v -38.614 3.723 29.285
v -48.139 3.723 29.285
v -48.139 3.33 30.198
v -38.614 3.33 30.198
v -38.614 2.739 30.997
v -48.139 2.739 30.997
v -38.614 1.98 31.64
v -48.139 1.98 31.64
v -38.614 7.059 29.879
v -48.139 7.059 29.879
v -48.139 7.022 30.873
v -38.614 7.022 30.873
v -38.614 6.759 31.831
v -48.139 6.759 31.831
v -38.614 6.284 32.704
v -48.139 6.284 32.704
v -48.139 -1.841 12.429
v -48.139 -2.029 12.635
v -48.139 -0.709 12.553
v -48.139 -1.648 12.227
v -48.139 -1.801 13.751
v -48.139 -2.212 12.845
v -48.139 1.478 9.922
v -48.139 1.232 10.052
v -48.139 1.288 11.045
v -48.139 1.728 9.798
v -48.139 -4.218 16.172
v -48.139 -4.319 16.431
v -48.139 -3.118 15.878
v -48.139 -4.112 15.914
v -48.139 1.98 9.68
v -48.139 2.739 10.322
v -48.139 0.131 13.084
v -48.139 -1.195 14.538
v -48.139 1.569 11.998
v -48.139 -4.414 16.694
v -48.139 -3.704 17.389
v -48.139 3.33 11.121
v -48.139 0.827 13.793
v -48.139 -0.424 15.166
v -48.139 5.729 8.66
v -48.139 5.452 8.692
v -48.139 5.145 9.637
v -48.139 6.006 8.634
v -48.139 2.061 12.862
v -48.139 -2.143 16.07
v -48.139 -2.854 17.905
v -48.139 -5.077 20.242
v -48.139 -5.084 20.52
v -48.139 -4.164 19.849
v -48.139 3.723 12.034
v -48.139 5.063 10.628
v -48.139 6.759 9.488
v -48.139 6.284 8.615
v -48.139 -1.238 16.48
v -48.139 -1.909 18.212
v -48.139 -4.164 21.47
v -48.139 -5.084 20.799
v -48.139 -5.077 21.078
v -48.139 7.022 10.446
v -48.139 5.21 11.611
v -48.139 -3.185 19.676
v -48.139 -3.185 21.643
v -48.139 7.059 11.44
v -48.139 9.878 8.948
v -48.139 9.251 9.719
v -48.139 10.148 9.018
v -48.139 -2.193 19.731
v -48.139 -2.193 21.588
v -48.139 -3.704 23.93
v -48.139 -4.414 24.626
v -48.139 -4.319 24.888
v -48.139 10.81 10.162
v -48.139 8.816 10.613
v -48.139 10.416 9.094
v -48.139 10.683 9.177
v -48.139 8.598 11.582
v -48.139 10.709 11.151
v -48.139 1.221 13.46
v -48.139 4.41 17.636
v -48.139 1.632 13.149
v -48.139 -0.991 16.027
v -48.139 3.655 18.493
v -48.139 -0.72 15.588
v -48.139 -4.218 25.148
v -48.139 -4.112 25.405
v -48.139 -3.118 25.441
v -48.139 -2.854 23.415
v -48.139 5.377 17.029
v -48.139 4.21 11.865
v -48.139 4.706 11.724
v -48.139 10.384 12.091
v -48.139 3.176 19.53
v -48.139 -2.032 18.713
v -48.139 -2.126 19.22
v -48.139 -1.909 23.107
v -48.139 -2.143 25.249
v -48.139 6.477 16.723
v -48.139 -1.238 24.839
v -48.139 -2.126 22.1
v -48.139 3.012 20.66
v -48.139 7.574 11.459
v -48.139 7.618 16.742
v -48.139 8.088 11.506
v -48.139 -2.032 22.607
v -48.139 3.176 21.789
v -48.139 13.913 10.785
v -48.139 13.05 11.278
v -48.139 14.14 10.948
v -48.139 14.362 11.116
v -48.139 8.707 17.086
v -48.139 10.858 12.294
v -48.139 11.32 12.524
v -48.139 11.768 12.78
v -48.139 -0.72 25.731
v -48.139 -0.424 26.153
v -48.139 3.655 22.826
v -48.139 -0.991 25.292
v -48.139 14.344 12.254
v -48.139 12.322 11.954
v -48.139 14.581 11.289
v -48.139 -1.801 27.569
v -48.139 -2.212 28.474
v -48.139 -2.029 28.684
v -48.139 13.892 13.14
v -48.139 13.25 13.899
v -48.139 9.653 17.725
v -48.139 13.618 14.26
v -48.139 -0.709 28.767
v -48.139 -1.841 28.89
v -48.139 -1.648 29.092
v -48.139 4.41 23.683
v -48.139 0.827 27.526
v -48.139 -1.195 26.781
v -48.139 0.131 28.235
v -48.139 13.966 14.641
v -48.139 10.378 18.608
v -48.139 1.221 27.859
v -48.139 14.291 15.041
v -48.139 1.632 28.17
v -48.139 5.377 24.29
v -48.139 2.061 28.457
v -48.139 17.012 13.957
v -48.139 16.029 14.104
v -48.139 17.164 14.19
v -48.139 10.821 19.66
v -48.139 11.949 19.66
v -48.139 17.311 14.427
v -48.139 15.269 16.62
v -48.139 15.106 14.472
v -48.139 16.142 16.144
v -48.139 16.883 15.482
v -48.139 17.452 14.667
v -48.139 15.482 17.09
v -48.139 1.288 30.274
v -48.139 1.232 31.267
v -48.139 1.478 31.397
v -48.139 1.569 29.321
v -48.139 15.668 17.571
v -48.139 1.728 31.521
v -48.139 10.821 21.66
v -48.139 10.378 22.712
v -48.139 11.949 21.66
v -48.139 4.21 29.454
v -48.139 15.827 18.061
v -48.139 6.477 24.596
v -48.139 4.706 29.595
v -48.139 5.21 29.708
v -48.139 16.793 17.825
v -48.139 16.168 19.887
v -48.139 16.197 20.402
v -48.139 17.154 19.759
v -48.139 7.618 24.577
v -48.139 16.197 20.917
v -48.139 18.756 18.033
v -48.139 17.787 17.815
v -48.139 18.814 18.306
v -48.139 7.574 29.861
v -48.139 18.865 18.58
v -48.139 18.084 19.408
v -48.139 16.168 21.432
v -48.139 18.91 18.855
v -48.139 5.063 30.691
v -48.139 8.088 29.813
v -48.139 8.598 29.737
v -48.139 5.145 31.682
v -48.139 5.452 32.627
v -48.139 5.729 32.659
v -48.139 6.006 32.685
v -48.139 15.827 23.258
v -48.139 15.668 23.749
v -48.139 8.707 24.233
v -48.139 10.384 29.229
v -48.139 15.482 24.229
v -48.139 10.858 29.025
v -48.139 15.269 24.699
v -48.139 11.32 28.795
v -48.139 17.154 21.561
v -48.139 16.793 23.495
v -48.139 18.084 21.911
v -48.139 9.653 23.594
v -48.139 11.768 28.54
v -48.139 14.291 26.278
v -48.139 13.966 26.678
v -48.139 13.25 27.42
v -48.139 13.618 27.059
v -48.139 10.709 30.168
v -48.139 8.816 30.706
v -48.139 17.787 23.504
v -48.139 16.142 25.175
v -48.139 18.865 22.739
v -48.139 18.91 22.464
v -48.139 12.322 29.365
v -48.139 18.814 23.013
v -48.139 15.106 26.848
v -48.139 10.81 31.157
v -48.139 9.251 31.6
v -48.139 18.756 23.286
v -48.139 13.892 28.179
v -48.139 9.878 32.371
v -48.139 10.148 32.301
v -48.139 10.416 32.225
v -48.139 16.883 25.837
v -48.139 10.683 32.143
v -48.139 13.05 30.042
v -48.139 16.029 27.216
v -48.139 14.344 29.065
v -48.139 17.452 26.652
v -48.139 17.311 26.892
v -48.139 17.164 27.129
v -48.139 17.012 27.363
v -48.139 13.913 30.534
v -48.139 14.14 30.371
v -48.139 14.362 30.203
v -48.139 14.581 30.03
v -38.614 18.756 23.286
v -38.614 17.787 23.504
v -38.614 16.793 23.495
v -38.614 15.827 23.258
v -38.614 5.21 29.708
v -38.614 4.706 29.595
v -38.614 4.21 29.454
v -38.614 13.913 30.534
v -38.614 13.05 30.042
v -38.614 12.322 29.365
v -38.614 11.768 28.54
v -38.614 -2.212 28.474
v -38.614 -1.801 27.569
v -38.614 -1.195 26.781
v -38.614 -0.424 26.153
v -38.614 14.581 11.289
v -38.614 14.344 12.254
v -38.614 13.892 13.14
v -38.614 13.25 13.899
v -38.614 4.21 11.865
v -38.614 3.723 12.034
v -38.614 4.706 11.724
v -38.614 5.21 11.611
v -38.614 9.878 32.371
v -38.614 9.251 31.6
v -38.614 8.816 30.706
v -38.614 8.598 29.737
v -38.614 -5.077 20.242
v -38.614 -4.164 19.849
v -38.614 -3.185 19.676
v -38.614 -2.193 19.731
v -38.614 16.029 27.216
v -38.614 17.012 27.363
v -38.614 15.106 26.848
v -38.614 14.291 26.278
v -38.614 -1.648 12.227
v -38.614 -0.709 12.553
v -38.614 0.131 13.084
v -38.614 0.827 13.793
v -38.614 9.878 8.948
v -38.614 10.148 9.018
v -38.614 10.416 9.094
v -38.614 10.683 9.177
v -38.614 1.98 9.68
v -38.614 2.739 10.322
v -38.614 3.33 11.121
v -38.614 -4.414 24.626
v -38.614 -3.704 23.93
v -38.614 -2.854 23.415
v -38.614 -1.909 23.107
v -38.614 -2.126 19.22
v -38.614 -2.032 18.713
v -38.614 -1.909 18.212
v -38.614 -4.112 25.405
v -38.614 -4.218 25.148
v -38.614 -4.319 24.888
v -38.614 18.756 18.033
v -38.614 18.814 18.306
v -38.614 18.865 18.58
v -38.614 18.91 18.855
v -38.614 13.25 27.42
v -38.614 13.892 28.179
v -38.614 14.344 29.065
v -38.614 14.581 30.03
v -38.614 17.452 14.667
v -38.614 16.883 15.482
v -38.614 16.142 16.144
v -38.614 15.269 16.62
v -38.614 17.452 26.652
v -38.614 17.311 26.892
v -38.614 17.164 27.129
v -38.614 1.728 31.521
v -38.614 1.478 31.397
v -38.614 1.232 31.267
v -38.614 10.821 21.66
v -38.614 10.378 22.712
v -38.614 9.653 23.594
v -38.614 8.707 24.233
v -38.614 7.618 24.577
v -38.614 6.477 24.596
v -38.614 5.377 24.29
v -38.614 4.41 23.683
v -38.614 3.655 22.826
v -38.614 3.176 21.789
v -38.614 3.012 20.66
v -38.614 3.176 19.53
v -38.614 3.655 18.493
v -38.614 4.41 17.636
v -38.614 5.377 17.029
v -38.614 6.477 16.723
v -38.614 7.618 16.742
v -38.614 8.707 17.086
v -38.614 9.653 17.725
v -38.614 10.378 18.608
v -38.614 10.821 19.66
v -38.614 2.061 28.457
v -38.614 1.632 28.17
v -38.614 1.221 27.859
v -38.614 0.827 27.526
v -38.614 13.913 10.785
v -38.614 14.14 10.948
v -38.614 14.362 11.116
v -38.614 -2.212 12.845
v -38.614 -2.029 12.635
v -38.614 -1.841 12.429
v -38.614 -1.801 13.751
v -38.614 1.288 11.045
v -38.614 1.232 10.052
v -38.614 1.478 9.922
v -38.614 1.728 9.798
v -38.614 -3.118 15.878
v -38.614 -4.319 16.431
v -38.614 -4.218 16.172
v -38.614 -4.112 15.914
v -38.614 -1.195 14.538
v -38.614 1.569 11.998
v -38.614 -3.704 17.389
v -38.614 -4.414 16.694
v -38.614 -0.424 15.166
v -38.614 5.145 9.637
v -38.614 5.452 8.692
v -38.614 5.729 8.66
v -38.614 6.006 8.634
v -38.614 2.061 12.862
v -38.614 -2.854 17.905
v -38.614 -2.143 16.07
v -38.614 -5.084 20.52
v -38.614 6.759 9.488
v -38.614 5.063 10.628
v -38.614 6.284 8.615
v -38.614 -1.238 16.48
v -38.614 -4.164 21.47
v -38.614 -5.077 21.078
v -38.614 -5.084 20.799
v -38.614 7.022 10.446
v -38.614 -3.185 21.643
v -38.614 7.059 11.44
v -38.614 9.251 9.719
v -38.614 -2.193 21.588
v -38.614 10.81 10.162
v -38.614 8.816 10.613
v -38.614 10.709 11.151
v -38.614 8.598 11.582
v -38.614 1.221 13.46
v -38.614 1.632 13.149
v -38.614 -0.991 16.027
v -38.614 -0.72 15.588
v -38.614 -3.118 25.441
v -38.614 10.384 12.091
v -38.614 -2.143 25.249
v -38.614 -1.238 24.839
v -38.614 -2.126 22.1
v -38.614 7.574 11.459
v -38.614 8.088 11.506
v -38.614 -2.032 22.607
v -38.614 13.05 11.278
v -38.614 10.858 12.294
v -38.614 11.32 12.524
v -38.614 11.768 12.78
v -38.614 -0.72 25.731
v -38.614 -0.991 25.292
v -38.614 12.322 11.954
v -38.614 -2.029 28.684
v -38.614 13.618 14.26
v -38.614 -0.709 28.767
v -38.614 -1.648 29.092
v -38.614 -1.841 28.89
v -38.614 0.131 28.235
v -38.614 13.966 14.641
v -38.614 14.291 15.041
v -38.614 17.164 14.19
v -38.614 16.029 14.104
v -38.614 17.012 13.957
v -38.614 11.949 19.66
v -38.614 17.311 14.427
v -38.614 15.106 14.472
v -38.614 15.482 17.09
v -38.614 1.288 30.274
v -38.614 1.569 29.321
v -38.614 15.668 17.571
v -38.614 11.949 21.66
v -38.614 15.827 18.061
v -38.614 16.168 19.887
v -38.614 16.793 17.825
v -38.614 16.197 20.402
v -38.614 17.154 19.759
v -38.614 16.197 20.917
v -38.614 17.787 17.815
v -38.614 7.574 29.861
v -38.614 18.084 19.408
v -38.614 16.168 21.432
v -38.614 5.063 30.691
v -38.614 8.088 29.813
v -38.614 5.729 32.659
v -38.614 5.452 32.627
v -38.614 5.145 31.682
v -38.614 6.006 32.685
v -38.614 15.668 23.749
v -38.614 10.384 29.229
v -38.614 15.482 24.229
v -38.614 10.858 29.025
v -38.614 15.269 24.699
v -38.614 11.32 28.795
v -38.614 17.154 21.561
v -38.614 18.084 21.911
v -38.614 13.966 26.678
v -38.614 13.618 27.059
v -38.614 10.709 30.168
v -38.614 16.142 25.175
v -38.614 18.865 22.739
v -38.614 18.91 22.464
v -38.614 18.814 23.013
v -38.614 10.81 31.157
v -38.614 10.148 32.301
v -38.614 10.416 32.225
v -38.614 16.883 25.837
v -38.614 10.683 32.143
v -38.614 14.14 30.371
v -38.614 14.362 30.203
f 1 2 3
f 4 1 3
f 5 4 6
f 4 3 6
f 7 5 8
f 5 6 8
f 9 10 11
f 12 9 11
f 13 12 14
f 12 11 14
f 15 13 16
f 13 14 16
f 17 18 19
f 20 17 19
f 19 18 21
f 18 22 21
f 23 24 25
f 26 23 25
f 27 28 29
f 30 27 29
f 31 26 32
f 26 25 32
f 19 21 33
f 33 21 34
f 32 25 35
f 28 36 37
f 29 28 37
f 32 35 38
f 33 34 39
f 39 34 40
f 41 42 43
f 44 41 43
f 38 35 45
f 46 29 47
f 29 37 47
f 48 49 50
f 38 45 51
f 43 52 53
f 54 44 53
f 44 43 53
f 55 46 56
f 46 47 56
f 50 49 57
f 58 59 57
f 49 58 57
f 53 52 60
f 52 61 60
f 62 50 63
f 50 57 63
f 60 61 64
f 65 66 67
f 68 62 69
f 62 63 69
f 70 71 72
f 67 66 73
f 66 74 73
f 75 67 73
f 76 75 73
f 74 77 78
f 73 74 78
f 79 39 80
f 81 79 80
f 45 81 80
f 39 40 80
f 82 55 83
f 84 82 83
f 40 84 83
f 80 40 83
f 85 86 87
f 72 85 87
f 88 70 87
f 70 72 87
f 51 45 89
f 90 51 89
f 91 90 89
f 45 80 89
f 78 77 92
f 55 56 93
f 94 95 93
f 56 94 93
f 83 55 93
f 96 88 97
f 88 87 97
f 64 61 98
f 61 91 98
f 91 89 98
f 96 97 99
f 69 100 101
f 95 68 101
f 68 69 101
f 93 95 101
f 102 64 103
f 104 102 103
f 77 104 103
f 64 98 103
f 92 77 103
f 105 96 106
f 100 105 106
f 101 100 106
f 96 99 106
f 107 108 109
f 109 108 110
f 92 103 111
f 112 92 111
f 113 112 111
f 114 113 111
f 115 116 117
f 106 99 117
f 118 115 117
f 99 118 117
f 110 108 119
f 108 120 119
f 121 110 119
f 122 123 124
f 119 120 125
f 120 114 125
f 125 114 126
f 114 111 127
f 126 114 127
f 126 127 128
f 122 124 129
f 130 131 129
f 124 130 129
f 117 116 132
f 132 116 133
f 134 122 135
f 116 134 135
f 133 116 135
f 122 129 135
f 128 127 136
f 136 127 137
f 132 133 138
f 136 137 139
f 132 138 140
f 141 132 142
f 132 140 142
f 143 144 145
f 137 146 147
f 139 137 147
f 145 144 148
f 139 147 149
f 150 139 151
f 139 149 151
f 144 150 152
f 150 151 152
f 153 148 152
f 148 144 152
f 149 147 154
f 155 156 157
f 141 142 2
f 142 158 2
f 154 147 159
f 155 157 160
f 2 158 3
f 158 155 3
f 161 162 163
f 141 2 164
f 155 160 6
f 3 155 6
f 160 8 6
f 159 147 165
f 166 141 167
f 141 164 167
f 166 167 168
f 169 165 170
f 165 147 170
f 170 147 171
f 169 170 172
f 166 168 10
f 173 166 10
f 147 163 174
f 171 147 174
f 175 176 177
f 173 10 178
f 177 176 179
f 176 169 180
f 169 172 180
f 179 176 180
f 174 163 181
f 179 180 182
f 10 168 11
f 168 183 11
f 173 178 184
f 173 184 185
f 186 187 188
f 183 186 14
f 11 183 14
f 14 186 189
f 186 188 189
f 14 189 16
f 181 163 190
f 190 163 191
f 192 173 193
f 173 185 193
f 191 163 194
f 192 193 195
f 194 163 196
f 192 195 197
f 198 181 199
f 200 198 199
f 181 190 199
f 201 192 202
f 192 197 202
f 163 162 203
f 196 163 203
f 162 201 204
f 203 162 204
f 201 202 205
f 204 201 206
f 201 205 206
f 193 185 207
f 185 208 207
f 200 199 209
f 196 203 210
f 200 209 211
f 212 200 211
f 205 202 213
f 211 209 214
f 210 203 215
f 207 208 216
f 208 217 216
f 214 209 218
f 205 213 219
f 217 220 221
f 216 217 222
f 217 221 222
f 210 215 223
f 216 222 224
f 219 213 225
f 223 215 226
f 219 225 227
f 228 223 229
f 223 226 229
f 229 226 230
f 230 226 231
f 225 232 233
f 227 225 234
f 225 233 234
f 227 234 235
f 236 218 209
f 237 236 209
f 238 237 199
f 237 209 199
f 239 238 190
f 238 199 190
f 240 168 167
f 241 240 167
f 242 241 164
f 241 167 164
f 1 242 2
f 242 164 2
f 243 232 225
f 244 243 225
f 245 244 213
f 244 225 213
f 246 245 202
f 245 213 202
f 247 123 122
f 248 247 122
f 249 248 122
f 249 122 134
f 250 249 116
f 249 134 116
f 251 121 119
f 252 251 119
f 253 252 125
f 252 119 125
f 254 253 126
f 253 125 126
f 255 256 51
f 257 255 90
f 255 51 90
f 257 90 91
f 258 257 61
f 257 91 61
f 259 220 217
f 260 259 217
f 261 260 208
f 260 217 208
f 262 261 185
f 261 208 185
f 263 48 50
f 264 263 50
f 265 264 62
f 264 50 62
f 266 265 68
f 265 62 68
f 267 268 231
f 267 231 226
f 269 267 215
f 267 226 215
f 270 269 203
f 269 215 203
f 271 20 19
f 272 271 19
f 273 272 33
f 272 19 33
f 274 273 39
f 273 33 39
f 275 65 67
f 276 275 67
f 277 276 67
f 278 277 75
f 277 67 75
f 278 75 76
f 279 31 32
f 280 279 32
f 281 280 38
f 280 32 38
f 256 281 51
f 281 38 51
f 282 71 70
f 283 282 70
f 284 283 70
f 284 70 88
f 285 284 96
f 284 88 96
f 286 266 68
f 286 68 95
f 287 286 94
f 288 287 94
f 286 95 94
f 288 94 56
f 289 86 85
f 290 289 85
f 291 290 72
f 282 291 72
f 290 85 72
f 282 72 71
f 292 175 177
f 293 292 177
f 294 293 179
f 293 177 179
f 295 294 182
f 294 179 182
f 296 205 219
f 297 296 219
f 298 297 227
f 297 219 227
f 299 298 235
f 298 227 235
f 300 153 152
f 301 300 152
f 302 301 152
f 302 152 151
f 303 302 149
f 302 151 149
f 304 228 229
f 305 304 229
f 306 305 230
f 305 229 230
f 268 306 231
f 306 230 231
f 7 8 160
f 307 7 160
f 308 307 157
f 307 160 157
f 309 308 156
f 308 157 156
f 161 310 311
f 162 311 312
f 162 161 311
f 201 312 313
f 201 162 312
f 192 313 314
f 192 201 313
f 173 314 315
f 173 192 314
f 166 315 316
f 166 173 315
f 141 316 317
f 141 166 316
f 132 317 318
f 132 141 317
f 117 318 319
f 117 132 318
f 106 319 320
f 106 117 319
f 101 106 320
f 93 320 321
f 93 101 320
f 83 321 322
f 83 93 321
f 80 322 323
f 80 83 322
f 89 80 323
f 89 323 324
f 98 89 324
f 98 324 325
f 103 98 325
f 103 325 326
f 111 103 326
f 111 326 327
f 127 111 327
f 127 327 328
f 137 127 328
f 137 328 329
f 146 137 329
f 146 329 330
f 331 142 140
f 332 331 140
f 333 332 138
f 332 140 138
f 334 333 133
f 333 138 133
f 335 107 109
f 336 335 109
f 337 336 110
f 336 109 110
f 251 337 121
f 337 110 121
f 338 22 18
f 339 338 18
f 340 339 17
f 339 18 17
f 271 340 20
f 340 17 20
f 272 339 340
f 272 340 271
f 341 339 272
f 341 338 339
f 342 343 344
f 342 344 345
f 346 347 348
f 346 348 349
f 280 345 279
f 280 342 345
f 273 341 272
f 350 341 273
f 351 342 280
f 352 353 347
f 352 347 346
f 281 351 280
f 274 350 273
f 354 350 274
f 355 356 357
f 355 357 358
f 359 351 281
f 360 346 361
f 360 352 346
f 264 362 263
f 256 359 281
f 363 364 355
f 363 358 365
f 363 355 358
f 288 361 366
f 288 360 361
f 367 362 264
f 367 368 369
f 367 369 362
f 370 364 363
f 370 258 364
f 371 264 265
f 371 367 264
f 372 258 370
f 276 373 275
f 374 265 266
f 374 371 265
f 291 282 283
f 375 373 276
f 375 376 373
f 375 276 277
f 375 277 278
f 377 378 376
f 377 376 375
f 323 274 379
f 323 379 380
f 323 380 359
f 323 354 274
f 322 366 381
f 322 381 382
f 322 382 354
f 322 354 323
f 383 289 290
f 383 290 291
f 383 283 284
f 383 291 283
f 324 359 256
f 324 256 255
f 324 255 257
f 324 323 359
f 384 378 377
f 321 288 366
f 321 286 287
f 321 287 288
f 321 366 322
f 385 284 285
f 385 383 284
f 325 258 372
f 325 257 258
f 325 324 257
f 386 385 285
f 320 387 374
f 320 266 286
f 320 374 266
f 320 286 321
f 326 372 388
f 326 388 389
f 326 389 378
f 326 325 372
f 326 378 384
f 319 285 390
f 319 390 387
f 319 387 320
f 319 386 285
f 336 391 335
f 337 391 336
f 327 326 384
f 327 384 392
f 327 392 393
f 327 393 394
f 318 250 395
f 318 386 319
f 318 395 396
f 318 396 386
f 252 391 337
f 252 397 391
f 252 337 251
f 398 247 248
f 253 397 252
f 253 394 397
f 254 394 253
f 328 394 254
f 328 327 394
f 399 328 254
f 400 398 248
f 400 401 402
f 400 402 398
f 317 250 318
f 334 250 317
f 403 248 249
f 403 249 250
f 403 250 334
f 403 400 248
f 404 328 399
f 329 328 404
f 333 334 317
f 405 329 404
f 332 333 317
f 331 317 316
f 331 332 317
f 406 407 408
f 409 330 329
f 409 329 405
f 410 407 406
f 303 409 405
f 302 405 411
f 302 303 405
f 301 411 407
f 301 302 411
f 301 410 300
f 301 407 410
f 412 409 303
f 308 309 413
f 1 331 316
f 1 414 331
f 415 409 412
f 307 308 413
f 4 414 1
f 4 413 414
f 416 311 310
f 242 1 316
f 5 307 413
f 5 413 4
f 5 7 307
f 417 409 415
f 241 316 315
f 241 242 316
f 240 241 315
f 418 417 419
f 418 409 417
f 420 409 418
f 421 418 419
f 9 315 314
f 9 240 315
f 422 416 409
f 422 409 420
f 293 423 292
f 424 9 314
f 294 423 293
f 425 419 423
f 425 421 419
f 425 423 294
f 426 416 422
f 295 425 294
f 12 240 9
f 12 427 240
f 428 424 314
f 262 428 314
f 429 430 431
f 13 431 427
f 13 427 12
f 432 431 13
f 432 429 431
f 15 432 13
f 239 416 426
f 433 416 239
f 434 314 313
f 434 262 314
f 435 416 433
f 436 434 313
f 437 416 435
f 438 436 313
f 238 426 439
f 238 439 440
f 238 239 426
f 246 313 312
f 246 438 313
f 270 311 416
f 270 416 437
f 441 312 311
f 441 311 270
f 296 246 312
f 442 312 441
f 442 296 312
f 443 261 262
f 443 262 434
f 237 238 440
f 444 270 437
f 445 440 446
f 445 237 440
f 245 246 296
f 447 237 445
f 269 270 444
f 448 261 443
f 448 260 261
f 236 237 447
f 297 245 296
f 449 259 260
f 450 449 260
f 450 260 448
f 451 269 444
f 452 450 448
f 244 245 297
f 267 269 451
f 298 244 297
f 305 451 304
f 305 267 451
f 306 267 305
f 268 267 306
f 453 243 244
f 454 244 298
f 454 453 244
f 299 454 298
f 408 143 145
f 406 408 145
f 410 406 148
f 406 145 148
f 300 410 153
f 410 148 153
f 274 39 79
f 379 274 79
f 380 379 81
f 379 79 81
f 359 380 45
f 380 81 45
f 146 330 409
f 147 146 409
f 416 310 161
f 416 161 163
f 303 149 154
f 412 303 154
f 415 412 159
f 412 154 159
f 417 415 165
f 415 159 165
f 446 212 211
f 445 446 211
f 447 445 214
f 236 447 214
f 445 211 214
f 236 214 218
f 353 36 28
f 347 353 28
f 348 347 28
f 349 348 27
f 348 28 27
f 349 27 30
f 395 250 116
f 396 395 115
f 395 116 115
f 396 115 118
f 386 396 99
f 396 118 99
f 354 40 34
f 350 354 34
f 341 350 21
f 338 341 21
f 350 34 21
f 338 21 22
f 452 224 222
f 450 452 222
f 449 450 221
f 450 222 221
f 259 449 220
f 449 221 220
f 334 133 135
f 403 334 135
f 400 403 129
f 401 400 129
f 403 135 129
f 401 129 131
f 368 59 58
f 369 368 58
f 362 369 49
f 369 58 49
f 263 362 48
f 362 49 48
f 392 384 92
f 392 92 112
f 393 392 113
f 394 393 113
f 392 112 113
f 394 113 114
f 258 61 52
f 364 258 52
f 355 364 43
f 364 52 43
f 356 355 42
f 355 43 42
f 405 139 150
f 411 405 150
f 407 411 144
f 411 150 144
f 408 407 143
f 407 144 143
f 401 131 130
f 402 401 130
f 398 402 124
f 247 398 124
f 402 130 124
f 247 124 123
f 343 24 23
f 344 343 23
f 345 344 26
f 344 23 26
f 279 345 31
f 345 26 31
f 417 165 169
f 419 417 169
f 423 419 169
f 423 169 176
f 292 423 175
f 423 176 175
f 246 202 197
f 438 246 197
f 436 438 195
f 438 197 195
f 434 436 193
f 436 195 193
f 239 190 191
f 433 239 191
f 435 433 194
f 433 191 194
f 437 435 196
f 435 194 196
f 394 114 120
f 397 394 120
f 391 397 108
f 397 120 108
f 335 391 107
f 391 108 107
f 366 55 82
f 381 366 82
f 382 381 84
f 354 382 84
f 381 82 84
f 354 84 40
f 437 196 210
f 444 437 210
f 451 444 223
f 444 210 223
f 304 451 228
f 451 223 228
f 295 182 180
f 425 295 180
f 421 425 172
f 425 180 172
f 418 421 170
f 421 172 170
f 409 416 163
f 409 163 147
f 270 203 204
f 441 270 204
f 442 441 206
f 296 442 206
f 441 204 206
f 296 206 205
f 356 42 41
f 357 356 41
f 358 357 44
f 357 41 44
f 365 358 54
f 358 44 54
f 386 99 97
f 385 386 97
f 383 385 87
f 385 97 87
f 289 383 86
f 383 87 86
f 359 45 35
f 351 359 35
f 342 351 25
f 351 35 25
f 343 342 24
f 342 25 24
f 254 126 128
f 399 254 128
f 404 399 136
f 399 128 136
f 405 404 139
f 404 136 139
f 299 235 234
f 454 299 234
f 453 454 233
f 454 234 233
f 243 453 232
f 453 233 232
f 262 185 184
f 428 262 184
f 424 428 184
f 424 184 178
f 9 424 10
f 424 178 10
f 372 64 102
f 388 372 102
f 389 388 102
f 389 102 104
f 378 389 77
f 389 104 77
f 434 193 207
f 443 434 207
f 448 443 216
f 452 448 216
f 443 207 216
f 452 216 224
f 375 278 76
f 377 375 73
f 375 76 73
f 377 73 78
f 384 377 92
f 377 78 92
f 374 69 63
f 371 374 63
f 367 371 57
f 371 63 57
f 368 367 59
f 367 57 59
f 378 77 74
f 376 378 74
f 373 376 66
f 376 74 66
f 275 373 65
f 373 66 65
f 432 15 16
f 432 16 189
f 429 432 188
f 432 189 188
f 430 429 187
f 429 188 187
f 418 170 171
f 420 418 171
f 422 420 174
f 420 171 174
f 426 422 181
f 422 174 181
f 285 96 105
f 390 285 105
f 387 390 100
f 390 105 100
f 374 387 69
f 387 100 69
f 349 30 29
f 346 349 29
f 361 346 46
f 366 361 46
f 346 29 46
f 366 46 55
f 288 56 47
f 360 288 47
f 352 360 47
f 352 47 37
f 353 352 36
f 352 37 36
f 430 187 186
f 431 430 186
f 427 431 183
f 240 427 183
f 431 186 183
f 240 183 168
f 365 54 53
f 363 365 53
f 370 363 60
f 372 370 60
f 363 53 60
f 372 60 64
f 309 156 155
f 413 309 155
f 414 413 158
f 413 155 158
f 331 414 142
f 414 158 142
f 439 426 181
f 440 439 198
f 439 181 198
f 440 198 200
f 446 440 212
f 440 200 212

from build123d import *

# Parameters (mm, degrees)
SPUR_START             = -48.138720077
SPUR_GEAR_AI_OUTLINE_R = 3.96875
SPUR_GEAR_AI_DEPTH     = 9.525
SKETCH1_W              = 2
SKETCH1_H              = 2
CUT_EXTRUDE1_DEPTH     = 39.960158194


# Read off the part's stored shape, not the designer's step: spur gear_ai
with BuildPart() as part:
    # spur gear_ai outline → spur gear_ai (new body)
    with BuildSketch(Plane.YZ.offset(SPUR_START)):
        with BuildLine():
            ThreePointArc((17.012312953, 13.95653765), (17.238554936, 14.308167954), (17.452476746, 14.667426586))
            ThreePointArc((17.452476746, 14.667426586), (16.531280061, 15.83450279), (15.268831698, 16.619929001))
            ThreePointArc((15.268831698, 16.619929001), (15.578265643, 17.328851589), (15.827189257, 18.061216004))
            ThreePointArc((15.827189257, 18.061216004), (17.289288072, 17.791147015), (18.756314792, 18.033020543))
            ThreePointArc((18.756314792, 18.033020543), (18.840255641, 18.442634067), (18.909952602, 18.854910235))
            ThreePointArc((18.909952602, 18.854910235), (17.629365722, 19.61040176), (16.168439009, 19.886740939))
            ThreePointArc((16.168439009, 19.886740939), (16.200885193, 20.659571999), (16.168439009, 21.43240306))
            ThreePointArc((16.168439009, 21.43240306), (17.629365722, 21.708742239), (18.909952602, 22.464233764))
            ThreePointArc((18.909952602, 22.464233764), (18.840255641, 22.876509932), (18.756314792, 23.286123456))
            ThreePointArc((18.756314792, 23.286123456), (17.289288072, 23.527996984), (15.827189257, 23.257927995))
            ThreePointArc((15.827189257, 23.257927995), (15.578265643, 23.99029241), (15.268831698, 24.699214998))
            ThreePointArc((15.268831698, 24.699214998), (16.531280061, 25.484641209), (17.452476746, 26.651717413))
            ThreePointArc((17.452476746, 26.651717413), (17.238554936, 27.010976045), (17.012312953, 27.362606349))
            ThreePointArc((17.012312953, 27.362606349), (15.55697648, 27.05819552), (14.291170111, 26.278192676))
            ThreePointArc((14.291170111, 26.278192676), (13.794495212, 26.871180574), (13.249864274, 27.420450766))
            ThreePointArc((13.249864274, 27.420450766), (14.143333641, 28.608887845), (14.580727415, 30.029928621))
            ThreePointArc((14.580727415, 30.029928621), (14.251472081, 30.287649847), (13.913484198, 30.533807309))
            ThreePointArc((13.913484198, 30.533807309), (12.666389228, 29.724224493), (11.767829468, 28.5396315))
            ThreePointArc((11.767829468, 28.5396315), (11.090481981, 28.913156579), (10.384209477, 29.228592392))
            ThreePointArc((10.384209477, 29.228592392), (10.788031858, 30.659535328), (10.682550269, 32.142621244))
            ThreePointArc((10.682550269, 32.142621244), (10.282429168, 32.263998384), (9.878342522, 32.371438077))
            ThreePointArc((9.878342522, 32.371438077), (9.00791614, 31.166021918), (8.597958464, 29.736824624))
            ThreePointArc((8.597958464, 29.736824624), (7.831417921, 29.840440252), (7.058889866, 29.879440332))
            ThreePointArc((7.058889866, 29.879440332), (6.918526812, 31.359632351), (6.284415731, 32.704464437))
            ThreePointArc((6.284415731, 32.704464437), (5.867467436, 32.673104837), (5.451856166, 32.627316432))
            ThreePointArc((5.451856166, 32.627316432), (5.075654279, 31.188865063), (5.209665743, 29.708084482))
            ThreePointArc((5.209665743, 29.708084482), (4.457457692, 29.527796795), (3.72300828, 29.285093965))
            ThreePointArc((3.72300828, 29.285093965), (3.057416599, 30.614626934), (1.980316242, 31.639578163))
            ThreePointArc((1.980316242, 31.639578163), (1.60285193, 31.45971711), (1.231846643, 31.266884587))
            ThreePointArc((1.231846643, 31.266884587), (1.4006774, 29.789668835), (2.060559012, 28.45729259))
            ThreePointArc((2.060559012, 28.45729259), (1.424273318, 28.017450439), (0.827094013, 27.52582306))
            ThreePointArc((0.827094013, 27.52582306), (-0.273834451, 28.525136184), (-1.648455712, 29.091781215))
            ThreePointArc((-1.648455712, 29.091781215), (-1.935457393, 28.78770994), (-2.211750379, 28.473876399))
            ThreePointArc((-2.211750379, 28.473876399), (-1.520688507, 27.157402438), (-0.424057414, 26.153375324))
            ThreePointArc((-0.424057414, 26.153375324), (-0.858486842, 25.513381828), (-1.237743667, 24.839226903))
            ThreePointArc((-1.237743667, 24.839226903), (-2.625322424, 25.373357406), (-4.111814371, 25.405167687))
            ThreePointArc((-4.111814371, 25.405167687), (-4.269592255, 25.017952702), (-4.41385804, 24.625503102))
            ThreePointArc((-4.41385804, 24.625503102), (-3.293896789, 23.647568035), (-1.908622321, 23.107489476))
            ThreePointArc((-1.908622321, 23.107489476), (-2.082523381, 22.353779304), (-2.19263699, 21.58814519))
            ThreePointArc((-2.19263699, 21.58814519), (-3.67946584, 21.58495579), (-5.077069498, 21.077635166))
            ThreePointArc((-5.077069498, 21.077635166), (-5.084314807, 20.659572), (-5.077069498, 20.241508833))
            ThreePointArc((-5.077069498, 20.241508833), (-3.67946584, 19.734188209), (-2.19263699, 19.730998809))
            ThreePointArc((-2.19263699, 19.730998809), (-2.082523381, 18.965364695), (-1.908622321, 18.211654523))
            ThreePointArc((-1.908622321, 18.211654523), (-3.293896789, 17.671575965), (-4.41385804, 16.693640897))
            ThreePointArc((-4.41385804, 16.693640897), (-4.269592255, 16.301191297), (-4.111814371, 15.913976312))
            ThreePointArc((-4.111814371, 15.913976312), (-2.625322424, 15.945786593), (-1.237743667, 16.479917096))
            ThreePointArc((-1.237743667, 16.479917096), (-0.858486842, 15.805762171), (-0.424057414, 15.165768676))
            ThreePointArc((-0.424057414, 15.165768676), (-1.520688507, 14.161741561), (-2.211750379, 12.8452676))
            ThreePointArc((-2.211750379, 12.8452676), (-1.935457393, 12.531434059), (-1.648455712, 12.227362784))
            ThreePointArc((-1.648455712, 12.227362784), (-0.273834451, 12.794007815), (0.827094013, 13.793320939))
            ThreePointArc((0.827094013, 13.793320939), (1.424273319, 13.301693561), (2.060559012, 12.861851409))
            ThreePointArc((2.060559012, 12.861851409), (1.4006774, 11.529475164), (1.231846643, 10.052259412))
            ThreePointArc((1.231846643, 10.052259412), (1.60285193, 9.859426889), (1.980316242, 9.679565836))
            ThreePointArc((1.980316242, 9.679565836), (3.057416599, 10.704517066), (3.72300828, 12.034050035))
            ThreePointArc((3.72300828, 12.034050035), (4.457457692, 11.791347204), (5.209665743, 11.611059517))
            ThreePointArc((5.209665743, 11.611059517), (5.075654279, 10.130278936), (5.451856166, 8.691827567))
            ThreePointArc((5.451856166, 8.691827567), (5.867467436, 8.646039163), (6.284415731, 8.614679562))
            ThreePointArc((6.284415731, 8.614679562), (6.918526812, 9.959511648), (7.058889866, 11.439703667))
            ThreePointArc((7.058889866, 11.439703667), (7.831417921, 11.478703747), (8.597958464, 11.582319375))
            ThreePointArc((8.597958464, 11.582319375), (9.00791614, 10.153122081), (9.878342522, 8.947705923))
            ThreePointArc((9.878342522, 8.947705923), (10.282429168, 9.055145615), (10.682550269, 9.176522755))
            ThreePointArc((10.682550269, 9.176522755), (10.788031858, 10.659608671), (10.384209477, 12.090551607))
            ThreePointArc((10.384209477, 12.090551607), (11.090481981, 12.405987421), (11.767829468, 12.779512499))
            ThreePointArc((11.767829468, 12.779512499), (12.666389228, 11.594919506), (13.913484198, 10.78533669))
            ThreePointArc((13.913484198, 10.78533669), (14.251472081, 11.031494152), (14.580727415, 11.289215378))
            ThreePointArc((14.580727415, 11.289215378), (14.143333641, 12.710256154), (13.249864274, 13.898693234))
            ThreePointArc((13.249864274, 13.898693234), (13.794495212, 14.447963426), (14.291170111, 15.040951324))
            ThreePointArc((14.291170111, 15.040951324), (15.55697648, 14.260948479), (17.012312953, 13.95653765))
        make_face()
        with Locations((6.980685193, 20.659572)):
            Circle(SPUR_GEAR_AI_OUTLINE_R, mode=Mode.SUBTRACT)
    extrude(amount=SPUR_GEAR_AI_DEPTH)

    # Sketch1 → Cut-Extrude1 (cut, through all)
    with BuildSketch(Plane(origin=(-38.613720077, 0, 0), x_dir=(0, 0, -1), z_dir=(1, 0, 0))):
        with Locations((-20.659572, 10.949435193)):
            Rectangle(SKETCH1_W, SKETCH1_H)
    extrude(amount=-CUT_EXTRUDE1_DEPTH, mode=Mode.SUBTRACT)


solid = part.part
